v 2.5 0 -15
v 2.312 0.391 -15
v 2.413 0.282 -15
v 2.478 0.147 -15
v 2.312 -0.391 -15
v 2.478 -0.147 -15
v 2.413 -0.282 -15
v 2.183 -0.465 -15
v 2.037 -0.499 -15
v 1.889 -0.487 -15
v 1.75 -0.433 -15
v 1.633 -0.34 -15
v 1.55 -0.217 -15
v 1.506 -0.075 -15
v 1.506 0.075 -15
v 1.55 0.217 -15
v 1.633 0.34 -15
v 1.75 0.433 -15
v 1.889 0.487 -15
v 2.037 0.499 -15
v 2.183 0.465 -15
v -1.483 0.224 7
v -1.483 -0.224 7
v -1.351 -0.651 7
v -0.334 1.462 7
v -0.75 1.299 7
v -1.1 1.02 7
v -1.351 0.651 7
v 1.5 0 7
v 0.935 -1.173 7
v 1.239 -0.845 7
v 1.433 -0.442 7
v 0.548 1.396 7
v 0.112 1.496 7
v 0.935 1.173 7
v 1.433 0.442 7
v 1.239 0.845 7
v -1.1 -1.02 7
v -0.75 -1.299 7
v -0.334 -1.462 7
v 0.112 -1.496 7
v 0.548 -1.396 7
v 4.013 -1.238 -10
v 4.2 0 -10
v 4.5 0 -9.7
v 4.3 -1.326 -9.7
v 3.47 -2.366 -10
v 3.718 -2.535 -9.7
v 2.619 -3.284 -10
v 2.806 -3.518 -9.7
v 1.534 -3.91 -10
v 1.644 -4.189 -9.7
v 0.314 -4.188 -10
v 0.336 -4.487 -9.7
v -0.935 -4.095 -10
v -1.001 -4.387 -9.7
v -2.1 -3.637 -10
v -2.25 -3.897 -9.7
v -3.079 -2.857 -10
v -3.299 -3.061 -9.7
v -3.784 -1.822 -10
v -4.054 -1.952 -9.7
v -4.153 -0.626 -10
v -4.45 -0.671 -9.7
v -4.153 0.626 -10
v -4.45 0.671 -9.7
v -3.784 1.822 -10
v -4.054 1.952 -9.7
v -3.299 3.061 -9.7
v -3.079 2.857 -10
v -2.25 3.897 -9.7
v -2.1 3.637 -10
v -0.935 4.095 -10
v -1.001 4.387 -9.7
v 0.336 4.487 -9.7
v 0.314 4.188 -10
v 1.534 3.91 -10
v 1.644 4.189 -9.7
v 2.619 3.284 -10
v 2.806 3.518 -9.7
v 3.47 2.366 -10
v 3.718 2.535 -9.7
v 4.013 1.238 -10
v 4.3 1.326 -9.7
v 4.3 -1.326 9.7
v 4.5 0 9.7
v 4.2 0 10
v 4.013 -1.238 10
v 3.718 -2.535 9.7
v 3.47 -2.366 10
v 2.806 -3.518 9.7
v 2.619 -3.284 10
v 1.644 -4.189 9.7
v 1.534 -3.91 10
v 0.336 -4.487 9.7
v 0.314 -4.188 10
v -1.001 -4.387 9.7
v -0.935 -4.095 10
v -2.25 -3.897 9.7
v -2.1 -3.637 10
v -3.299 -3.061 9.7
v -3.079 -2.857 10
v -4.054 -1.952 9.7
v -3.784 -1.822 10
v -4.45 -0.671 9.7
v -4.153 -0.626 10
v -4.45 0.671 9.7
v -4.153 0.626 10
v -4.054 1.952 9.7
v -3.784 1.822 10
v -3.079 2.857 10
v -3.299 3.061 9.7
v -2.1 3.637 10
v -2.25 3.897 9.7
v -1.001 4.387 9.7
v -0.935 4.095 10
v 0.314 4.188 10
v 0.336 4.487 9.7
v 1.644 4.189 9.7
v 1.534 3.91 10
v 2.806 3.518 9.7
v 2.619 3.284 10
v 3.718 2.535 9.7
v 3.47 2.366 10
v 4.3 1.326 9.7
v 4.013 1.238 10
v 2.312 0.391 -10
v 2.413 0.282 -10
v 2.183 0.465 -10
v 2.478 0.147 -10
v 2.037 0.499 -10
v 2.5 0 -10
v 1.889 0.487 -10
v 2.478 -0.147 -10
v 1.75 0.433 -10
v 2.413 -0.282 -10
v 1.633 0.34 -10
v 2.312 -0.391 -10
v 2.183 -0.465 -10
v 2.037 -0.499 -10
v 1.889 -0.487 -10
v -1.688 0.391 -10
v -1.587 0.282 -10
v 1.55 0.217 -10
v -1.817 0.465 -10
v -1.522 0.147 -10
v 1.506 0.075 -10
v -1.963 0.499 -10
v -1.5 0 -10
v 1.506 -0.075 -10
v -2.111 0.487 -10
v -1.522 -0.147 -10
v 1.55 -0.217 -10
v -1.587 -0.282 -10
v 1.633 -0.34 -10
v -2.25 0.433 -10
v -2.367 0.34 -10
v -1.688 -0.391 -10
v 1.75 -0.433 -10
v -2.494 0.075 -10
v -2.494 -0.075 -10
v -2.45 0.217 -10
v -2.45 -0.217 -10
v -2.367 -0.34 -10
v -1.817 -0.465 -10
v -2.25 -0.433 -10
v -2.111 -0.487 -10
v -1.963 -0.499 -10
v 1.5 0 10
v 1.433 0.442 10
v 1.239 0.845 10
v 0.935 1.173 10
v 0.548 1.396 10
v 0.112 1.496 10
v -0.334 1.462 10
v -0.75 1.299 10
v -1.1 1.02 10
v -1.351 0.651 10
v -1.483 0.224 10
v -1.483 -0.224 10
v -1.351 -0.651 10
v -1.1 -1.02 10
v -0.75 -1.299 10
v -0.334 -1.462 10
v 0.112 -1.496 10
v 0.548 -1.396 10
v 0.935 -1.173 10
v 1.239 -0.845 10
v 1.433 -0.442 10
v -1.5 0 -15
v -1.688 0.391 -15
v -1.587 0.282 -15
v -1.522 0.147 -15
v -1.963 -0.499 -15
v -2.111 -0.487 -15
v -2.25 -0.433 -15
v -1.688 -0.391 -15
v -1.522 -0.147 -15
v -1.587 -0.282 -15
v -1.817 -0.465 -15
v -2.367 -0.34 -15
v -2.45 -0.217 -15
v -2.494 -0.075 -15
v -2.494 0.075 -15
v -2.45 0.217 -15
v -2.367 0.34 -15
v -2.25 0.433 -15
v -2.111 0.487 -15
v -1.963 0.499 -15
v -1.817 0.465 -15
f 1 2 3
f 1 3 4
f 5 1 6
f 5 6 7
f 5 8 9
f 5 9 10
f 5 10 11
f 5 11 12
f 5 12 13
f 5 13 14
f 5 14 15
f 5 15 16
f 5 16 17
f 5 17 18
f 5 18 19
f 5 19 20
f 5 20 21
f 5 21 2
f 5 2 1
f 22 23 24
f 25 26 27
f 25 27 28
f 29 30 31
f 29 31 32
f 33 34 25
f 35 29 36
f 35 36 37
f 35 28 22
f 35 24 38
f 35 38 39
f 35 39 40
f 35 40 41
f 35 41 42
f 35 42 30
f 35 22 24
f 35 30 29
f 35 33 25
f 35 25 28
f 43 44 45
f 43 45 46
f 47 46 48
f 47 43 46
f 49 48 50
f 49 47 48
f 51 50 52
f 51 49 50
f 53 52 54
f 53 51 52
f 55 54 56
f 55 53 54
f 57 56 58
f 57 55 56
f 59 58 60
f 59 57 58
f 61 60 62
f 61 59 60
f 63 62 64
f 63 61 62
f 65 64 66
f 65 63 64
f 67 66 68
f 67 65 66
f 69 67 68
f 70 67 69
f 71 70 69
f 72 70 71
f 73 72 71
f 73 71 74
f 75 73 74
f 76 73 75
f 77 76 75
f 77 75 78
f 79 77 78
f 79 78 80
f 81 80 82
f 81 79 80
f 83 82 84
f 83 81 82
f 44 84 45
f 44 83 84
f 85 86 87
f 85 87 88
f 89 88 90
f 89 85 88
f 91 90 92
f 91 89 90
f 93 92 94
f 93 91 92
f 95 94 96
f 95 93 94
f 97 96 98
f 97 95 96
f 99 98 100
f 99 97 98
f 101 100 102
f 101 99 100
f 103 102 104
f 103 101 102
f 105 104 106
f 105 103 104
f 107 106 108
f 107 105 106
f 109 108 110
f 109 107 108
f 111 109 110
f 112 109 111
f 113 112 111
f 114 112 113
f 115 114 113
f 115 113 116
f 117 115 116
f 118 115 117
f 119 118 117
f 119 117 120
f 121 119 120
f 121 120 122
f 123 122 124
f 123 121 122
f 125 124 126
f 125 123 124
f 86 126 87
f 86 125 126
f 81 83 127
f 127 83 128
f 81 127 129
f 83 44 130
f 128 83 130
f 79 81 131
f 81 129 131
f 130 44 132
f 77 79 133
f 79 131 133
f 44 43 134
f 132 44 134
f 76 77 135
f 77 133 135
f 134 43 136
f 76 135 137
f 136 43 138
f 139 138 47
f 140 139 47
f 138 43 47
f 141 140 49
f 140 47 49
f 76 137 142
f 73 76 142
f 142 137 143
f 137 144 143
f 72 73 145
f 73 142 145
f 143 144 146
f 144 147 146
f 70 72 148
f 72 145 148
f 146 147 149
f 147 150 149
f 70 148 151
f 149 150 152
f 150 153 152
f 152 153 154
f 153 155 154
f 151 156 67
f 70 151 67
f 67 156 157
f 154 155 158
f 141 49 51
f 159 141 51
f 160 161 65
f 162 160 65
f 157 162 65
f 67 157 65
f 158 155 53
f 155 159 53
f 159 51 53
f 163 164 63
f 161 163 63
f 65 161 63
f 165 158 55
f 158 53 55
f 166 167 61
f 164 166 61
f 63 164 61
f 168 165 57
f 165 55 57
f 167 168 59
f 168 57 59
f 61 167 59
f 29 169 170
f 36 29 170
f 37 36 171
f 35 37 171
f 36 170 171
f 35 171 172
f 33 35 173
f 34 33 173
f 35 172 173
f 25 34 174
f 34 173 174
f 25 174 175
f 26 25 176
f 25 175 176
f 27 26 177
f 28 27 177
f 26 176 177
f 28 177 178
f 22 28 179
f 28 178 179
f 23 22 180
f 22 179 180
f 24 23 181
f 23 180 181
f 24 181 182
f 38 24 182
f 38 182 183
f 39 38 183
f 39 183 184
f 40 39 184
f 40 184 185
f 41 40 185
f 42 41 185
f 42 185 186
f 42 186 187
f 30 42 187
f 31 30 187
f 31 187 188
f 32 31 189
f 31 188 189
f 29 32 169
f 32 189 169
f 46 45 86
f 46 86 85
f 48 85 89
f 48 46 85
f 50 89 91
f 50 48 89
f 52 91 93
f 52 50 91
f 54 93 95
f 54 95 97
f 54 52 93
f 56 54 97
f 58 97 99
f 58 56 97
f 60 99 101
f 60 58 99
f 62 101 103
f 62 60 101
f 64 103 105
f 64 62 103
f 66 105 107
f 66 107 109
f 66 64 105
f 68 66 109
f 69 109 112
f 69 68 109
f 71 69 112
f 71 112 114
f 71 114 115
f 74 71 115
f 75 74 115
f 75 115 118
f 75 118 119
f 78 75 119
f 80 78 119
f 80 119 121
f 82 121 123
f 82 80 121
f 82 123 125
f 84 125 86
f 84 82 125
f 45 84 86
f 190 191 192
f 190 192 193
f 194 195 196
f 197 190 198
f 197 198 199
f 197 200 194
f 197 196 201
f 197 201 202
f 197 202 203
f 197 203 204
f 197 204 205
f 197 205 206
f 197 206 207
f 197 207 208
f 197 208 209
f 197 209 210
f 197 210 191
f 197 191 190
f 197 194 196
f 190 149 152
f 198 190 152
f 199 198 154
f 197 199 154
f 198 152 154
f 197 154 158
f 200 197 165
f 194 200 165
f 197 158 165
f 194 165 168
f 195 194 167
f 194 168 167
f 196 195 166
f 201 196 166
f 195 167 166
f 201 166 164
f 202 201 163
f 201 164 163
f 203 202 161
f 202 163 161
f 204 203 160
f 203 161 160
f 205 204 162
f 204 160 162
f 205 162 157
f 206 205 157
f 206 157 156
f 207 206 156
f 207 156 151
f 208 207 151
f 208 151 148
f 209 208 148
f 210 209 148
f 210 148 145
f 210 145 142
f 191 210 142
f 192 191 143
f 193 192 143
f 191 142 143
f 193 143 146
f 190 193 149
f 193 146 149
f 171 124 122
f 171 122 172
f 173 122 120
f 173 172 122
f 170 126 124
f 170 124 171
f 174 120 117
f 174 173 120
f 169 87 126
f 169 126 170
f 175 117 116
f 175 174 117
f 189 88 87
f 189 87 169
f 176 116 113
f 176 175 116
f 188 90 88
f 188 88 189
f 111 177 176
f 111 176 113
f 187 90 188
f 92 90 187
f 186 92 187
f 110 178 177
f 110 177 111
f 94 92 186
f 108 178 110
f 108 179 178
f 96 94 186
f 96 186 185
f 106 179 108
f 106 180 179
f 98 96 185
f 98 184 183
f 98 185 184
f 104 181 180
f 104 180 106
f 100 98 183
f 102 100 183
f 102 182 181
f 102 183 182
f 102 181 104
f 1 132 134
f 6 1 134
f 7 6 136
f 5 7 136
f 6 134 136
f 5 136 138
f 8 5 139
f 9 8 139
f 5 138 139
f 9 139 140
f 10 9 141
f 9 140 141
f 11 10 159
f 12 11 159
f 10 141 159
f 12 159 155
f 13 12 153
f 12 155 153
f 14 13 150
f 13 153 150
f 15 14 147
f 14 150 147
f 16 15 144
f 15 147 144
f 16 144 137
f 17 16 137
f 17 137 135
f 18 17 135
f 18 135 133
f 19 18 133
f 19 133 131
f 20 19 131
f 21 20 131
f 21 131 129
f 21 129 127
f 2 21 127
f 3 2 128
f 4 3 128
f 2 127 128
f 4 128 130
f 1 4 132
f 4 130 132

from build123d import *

# Parameters (mm, degrees)
SKETCH1_W           = 20
SKETCH1_H           = 4.5
SKETCH2_R           = 1.5
CUT_EXTRUDE1_DEPTH  = 3
CHAMFER1_SIZE       = 0.3
SKETCH3_R           = 0.5
BOSS_EXTRUDE1_DEPTH = 5


with BuildPart() as part:
    # Sketch1 → Revolve1 (revolve)
    with BuildSketch(Plane(origin=(0, 0, 0), x_dir=(0, 0, -1), z_dir=(1, 0, 0)), mode=Mode.PRIVATE) as revolve1_sk:
        with Locations((0, 2.25)):
            Rectangle(SKETCH1_W, SKETCH1_H)
    revolve(revolve1_sk.sketch.rotate(Axis((0, 0, 10), (0, 0, -1)), 90), axis=Axis((0, 0, 10), (0, 0, -1)))

    # Sketch2 → Cut-Extrude1 (cut)
    with BuildSketch(Plane.XY.offset(10)):
        Circle(SKETCH2_R)
    extrude(amount=-CUT_EXTRUDE1_DEPTH, mode=Mode.SUBTRACT)

    # Chamfer1
    chamfer1_edges = [part.edges().sort_by_distance(p)[0] for p in [
        (-4.5, 0, -10),
        (-4.5, 0, 10),
    ]]
    chamfer(chamfer1_edges, length=CHAMFER1_SIZE)

    # Sketch3 → Boss-Extrude1 (add)
    with BuildSketch(Plane(origin=(0, 0, -10), x_dir=(-1, 0, 0), z_dir=(0, 0, -1))):
        with Locations(Location((-2, 0, 0), (0, 0, 180))):
            Circle(SKETCH3_R)
        with Locations(Location((2, 0, 0), (0, 0, 180))):
            Circle(SKETCH3_R)
    extrude(amount=BOSS_EXTRUDE1_DEPTH)


solid = part.part
